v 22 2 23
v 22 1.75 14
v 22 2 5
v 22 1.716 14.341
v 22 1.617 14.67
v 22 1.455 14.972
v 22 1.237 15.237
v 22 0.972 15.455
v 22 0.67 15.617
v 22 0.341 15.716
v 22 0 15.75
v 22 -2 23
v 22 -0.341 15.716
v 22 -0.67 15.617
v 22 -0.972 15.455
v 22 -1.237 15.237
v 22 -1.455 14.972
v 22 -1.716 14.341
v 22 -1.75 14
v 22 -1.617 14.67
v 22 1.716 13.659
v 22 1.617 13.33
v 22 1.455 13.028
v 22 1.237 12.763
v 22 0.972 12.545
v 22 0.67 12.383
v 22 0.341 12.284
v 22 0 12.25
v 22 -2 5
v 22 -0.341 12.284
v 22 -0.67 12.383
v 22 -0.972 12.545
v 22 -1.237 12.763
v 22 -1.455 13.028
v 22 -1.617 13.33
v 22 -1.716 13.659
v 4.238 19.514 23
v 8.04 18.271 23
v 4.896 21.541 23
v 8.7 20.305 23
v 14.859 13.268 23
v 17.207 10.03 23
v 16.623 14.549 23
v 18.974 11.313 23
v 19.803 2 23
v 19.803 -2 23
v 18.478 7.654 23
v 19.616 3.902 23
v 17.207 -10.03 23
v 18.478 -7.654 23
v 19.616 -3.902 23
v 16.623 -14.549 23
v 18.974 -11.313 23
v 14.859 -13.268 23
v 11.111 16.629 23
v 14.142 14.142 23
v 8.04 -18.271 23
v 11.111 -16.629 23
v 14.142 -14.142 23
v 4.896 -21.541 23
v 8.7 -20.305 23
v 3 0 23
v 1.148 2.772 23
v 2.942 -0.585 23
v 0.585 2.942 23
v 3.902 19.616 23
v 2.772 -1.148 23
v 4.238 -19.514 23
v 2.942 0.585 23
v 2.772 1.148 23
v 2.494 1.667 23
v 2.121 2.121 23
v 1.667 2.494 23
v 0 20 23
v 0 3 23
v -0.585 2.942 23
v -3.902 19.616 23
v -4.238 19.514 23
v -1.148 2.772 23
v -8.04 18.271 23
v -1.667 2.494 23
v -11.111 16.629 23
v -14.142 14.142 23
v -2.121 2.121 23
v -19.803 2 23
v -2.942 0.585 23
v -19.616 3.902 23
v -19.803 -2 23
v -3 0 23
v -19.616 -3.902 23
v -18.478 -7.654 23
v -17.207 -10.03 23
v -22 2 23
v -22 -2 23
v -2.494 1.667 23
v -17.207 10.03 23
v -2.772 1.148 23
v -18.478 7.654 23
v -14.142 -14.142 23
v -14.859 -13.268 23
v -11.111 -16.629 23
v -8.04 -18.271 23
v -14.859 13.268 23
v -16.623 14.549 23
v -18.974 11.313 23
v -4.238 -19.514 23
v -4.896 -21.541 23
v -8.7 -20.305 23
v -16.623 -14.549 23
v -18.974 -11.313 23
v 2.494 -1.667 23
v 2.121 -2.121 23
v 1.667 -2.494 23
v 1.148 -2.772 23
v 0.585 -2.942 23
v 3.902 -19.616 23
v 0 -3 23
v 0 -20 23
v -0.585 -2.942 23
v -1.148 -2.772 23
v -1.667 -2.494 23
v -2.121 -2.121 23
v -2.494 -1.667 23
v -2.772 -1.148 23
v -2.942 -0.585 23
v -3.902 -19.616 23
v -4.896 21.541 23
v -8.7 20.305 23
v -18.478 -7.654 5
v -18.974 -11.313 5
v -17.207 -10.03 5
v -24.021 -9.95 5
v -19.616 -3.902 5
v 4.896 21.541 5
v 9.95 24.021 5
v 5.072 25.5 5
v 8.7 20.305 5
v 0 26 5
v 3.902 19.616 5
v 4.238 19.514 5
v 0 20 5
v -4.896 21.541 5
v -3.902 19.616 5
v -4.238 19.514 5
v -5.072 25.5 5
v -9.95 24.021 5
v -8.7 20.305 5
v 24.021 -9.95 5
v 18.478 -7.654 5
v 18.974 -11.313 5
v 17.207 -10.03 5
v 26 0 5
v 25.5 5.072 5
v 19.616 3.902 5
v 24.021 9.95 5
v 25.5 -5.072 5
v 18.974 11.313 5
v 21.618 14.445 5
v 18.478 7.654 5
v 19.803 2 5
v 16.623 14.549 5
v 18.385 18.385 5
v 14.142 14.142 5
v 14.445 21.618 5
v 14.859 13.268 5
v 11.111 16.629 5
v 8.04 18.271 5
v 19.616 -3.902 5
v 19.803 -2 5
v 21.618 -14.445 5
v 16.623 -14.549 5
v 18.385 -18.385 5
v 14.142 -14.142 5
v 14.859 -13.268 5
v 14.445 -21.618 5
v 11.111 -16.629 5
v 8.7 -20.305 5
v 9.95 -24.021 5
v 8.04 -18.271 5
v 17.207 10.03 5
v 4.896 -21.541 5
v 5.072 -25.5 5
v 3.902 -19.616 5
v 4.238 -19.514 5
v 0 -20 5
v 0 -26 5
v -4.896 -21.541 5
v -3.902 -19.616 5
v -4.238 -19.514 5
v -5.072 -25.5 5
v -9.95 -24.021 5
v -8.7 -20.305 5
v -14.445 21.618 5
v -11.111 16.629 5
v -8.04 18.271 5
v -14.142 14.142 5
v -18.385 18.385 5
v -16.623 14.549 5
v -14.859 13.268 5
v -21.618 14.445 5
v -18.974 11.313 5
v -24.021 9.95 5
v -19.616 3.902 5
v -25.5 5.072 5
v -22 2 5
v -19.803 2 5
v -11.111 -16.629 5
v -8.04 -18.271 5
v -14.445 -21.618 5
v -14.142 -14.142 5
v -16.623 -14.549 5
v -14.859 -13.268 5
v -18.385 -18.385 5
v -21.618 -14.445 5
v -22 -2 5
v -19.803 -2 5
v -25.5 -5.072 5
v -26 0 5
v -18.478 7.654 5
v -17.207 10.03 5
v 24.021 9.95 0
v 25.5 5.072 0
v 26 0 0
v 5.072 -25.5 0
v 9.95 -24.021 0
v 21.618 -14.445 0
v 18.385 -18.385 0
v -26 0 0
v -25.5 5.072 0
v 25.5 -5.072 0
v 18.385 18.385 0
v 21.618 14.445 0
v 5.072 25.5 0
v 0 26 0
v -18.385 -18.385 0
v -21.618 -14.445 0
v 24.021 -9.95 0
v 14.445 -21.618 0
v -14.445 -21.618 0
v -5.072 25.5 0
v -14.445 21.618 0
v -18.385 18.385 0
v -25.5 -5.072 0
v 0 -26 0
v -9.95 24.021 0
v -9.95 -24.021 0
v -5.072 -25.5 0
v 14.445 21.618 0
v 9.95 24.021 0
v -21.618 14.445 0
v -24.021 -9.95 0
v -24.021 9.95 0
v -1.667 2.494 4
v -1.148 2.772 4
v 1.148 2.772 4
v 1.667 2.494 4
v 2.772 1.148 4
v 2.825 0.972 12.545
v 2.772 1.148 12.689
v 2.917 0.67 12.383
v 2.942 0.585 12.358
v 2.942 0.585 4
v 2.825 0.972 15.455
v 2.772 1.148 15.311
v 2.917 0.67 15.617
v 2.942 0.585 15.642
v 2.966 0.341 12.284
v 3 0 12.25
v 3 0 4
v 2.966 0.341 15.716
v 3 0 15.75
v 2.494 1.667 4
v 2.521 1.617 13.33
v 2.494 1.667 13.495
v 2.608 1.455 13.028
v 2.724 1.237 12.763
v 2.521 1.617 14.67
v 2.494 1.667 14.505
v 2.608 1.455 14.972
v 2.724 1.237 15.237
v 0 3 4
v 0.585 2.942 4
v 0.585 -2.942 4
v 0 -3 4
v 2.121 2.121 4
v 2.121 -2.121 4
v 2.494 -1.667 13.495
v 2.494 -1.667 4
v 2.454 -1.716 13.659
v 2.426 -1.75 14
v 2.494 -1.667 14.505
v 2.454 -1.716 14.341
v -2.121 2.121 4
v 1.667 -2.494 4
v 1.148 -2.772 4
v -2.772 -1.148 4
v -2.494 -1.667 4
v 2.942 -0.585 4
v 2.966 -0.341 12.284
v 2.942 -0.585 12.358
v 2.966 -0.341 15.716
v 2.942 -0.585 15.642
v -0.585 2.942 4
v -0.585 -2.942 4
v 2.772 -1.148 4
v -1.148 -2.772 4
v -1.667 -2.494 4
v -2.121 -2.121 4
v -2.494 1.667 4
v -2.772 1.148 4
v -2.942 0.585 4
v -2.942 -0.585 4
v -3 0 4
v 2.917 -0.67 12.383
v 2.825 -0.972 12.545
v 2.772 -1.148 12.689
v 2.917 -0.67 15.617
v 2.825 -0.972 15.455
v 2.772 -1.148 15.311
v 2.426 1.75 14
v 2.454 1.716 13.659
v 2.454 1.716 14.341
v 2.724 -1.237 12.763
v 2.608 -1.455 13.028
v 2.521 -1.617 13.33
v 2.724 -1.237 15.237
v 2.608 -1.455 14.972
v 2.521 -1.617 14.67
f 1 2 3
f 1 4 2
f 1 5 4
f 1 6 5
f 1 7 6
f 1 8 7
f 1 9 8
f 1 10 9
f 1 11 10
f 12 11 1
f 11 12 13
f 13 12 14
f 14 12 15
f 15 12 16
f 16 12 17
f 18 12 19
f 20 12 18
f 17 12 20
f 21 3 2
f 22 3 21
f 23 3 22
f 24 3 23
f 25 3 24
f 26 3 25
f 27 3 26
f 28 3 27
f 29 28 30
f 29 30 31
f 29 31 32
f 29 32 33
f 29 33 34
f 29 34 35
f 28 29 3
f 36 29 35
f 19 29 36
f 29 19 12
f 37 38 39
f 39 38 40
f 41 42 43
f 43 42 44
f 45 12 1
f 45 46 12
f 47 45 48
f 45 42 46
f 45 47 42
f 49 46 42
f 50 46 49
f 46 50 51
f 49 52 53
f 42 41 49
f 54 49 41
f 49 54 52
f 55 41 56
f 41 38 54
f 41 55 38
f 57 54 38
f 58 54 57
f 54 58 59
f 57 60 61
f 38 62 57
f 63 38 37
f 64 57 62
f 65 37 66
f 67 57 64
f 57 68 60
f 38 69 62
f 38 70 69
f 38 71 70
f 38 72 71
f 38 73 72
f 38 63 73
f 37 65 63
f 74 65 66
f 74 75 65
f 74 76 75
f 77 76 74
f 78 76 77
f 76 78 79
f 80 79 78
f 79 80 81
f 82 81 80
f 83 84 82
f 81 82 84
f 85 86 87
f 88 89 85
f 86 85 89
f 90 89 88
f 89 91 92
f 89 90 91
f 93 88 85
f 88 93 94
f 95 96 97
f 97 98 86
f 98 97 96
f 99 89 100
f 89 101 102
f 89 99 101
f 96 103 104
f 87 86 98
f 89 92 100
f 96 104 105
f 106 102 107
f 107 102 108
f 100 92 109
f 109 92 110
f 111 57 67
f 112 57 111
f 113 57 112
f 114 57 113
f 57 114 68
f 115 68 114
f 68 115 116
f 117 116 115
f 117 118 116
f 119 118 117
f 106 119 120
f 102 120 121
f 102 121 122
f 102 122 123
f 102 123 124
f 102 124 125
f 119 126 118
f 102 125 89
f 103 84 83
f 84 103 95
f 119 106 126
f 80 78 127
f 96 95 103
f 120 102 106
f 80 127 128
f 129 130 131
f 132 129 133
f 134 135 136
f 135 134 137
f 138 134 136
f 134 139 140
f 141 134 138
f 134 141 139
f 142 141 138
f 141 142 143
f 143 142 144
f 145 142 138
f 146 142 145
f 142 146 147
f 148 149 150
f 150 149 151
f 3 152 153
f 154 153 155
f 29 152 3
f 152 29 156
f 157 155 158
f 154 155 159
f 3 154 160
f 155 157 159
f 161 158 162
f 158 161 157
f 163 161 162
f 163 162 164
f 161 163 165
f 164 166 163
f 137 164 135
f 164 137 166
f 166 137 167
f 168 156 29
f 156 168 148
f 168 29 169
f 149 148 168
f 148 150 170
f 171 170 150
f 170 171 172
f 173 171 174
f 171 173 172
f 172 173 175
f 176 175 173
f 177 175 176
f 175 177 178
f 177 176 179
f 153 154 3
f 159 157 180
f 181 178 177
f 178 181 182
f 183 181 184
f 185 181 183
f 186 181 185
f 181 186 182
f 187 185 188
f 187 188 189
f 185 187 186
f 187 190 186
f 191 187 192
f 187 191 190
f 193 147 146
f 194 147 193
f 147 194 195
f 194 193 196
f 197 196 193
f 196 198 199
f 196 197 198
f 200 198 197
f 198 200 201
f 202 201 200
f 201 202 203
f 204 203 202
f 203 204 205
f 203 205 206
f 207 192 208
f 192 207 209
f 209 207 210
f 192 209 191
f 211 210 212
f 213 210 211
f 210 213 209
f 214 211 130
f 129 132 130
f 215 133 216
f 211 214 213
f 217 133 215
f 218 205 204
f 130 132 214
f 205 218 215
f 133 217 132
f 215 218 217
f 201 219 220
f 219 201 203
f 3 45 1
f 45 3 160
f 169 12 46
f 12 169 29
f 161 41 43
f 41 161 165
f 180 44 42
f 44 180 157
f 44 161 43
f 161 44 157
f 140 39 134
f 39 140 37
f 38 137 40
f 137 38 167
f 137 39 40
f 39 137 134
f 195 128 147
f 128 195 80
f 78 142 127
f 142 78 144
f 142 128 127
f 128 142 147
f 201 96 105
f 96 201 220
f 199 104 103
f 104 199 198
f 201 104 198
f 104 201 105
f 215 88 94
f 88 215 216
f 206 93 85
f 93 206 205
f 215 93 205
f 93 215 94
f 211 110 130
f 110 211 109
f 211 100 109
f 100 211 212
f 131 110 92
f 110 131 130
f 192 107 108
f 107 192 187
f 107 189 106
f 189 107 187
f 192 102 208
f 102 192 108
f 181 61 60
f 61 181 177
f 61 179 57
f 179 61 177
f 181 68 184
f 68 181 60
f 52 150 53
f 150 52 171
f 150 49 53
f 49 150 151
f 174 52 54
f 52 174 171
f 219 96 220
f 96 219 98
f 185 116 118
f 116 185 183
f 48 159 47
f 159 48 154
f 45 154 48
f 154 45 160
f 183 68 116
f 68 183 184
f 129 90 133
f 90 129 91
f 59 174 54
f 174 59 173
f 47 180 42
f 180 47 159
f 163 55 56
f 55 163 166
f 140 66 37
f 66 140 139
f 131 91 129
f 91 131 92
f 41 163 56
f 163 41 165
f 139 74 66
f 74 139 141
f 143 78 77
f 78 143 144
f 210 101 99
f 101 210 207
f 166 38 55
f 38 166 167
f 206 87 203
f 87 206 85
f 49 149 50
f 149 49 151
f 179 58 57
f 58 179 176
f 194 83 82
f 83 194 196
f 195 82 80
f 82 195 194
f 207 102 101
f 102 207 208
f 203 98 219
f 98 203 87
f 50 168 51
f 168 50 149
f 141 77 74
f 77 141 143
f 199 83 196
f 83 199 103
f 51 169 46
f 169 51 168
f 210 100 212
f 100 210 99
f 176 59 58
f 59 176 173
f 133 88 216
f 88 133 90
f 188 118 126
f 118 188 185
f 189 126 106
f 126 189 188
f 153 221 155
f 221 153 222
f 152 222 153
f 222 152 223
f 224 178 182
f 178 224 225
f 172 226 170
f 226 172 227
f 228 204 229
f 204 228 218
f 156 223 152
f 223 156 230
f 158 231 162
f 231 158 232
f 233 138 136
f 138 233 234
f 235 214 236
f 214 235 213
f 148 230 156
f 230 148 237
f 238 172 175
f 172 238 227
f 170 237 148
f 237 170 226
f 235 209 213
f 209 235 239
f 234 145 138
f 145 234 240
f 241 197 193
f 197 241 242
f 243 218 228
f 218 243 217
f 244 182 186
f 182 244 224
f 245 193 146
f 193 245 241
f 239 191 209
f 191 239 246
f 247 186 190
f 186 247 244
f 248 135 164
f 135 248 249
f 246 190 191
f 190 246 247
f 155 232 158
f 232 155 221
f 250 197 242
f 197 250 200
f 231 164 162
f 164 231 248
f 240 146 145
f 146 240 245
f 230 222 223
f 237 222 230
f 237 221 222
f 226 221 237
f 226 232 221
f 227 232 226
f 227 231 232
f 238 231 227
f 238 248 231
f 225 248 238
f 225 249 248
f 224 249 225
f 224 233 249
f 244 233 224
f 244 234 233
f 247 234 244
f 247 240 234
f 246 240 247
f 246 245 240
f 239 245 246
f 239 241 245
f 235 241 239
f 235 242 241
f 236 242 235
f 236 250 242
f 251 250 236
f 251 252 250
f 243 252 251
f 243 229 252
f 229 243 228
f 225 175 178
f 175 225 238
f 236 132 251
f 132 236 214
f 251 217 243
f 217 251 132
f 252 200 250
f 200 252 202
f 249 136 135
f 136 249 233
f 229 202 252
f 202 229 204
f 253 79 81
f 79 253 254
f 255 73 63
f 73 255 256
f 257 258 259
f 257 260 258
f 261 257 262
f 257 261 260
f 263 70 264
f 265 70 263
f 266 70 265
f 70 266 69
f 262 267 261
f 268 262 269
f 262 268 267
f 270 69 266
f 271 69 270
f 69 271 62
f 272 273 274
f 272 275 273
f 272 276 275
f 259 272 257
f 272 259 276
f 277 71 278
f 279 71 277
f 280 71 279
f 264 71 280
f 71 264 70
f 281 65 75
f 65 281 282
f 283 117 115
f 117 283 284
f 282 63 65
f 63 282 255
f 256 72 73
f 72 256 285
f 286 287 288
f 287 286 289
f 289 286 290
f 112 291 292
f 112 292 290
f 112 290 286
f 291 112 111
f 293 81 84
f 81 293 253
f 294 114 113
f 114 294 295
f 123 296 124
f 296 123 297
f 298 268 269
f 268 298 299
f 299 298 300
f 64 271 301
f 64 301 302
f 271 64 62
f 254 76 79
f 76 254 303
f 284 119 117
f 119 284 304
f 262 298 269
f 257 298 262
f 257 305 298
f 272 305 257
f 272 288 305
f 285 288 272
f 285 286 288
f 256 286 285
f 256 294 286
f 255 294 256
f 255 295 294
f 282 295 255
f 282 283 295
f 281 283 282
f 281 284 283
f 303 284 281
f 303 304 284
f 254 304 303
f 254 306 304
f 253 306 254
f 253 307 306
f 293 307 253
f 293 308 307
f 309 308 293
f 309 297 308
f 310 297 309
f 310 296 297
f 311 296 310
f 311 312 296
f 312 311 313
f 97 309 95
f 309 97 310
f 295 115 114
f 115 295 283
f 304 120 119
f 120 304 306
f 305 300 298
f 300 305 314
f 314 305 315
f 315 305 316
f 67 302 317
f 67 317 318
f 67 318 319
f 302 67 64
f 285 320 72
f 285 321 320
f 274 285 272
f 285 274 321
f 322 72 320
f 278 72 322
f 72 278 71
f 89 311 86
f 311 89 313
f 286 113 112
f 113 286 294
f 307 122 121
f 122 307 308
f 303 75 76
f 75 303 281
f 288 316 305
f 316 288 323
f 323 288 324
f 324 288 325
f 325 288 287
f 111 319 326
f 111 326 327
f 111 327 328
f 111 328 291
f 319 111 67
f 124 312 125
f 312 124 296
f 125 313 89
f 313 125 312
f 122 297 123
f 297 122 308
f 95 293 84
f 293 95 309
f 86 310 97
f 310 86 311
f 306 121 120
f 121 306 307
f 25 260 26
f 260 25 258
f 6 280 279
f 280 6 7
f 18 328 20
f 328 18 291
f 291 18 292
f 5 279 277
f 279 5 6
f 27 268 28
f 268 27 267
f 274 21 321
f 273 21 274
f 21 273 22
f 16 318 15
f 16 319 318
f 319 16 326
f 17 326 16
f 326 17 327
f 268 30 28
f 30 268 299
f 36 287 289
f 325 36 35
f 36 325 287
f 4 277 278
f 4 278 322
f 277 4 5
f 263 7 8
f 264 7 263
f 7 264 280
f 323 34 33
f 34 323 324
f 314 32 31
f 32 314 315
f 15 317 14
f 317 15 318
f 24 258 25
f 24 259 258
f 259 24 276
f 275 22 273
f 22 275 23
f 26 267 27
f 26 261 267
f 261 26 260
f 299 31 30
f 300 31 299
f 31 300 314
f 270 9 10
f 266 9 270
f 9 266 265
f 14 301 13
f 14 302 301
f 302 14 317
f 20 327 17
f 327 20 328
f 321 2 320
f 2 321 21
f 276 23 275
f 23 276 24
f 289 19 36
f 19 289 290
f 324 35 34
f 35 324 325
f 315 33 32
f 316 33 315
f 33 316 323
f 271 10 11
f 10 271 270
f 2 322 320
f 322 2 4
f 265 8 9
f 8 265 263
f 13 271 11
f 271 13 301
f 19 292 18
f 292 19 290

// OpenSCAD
$fn = 32;

// ----------------------------------------------------------------------
// Control knob: skirt knob with grip ribs
// ----------------------------------------------------------------------

// --- parameters (mm) ---
skirt_d = 52;             // skirt diameter
skirt_t = 5;              // skirt thickness
rib_w = 4;                // grip rib width
rib_out = 3;              // grip rib radial protrusion
n_ribs = 10;              // number of grip ribs
knob_d = 40;              // knob body diameter
knob_h = 18;              // knob body height
bore_d = 6;               // shaft bore diameter
set_d = 3.5;              // set screw bore diameter

rib_step = 360 / n_ribs;  // rib angular step
total_h = skirt_t + knob_h;  // overall height

difference() {
  union() {
    translate([0, 0, skirt_t]) cylinder(h = knob_h, d = knob_d);
    cylinder(h = skirt_t, d = skirt_d);
    for (i = [0 : n_ribs - 1])
      rotate([0, 0, i * rib_step])
        translate([knob_d / 2 - 1, -rib_w / 2, skirt_t])
          cube([rib_out, rib_w, knob_h]);
  }
  translate([0, 0, skirt_t - 1]) cylinder(h = knob_h + 2, d = bore_d);
  translate([-1, 0, skirt_t + knob_h / 2]) rotate([0, 90, 0])
    cylinder(h = knob_d / 2 + bore_d / 2 + 2, d = set_d);
}
